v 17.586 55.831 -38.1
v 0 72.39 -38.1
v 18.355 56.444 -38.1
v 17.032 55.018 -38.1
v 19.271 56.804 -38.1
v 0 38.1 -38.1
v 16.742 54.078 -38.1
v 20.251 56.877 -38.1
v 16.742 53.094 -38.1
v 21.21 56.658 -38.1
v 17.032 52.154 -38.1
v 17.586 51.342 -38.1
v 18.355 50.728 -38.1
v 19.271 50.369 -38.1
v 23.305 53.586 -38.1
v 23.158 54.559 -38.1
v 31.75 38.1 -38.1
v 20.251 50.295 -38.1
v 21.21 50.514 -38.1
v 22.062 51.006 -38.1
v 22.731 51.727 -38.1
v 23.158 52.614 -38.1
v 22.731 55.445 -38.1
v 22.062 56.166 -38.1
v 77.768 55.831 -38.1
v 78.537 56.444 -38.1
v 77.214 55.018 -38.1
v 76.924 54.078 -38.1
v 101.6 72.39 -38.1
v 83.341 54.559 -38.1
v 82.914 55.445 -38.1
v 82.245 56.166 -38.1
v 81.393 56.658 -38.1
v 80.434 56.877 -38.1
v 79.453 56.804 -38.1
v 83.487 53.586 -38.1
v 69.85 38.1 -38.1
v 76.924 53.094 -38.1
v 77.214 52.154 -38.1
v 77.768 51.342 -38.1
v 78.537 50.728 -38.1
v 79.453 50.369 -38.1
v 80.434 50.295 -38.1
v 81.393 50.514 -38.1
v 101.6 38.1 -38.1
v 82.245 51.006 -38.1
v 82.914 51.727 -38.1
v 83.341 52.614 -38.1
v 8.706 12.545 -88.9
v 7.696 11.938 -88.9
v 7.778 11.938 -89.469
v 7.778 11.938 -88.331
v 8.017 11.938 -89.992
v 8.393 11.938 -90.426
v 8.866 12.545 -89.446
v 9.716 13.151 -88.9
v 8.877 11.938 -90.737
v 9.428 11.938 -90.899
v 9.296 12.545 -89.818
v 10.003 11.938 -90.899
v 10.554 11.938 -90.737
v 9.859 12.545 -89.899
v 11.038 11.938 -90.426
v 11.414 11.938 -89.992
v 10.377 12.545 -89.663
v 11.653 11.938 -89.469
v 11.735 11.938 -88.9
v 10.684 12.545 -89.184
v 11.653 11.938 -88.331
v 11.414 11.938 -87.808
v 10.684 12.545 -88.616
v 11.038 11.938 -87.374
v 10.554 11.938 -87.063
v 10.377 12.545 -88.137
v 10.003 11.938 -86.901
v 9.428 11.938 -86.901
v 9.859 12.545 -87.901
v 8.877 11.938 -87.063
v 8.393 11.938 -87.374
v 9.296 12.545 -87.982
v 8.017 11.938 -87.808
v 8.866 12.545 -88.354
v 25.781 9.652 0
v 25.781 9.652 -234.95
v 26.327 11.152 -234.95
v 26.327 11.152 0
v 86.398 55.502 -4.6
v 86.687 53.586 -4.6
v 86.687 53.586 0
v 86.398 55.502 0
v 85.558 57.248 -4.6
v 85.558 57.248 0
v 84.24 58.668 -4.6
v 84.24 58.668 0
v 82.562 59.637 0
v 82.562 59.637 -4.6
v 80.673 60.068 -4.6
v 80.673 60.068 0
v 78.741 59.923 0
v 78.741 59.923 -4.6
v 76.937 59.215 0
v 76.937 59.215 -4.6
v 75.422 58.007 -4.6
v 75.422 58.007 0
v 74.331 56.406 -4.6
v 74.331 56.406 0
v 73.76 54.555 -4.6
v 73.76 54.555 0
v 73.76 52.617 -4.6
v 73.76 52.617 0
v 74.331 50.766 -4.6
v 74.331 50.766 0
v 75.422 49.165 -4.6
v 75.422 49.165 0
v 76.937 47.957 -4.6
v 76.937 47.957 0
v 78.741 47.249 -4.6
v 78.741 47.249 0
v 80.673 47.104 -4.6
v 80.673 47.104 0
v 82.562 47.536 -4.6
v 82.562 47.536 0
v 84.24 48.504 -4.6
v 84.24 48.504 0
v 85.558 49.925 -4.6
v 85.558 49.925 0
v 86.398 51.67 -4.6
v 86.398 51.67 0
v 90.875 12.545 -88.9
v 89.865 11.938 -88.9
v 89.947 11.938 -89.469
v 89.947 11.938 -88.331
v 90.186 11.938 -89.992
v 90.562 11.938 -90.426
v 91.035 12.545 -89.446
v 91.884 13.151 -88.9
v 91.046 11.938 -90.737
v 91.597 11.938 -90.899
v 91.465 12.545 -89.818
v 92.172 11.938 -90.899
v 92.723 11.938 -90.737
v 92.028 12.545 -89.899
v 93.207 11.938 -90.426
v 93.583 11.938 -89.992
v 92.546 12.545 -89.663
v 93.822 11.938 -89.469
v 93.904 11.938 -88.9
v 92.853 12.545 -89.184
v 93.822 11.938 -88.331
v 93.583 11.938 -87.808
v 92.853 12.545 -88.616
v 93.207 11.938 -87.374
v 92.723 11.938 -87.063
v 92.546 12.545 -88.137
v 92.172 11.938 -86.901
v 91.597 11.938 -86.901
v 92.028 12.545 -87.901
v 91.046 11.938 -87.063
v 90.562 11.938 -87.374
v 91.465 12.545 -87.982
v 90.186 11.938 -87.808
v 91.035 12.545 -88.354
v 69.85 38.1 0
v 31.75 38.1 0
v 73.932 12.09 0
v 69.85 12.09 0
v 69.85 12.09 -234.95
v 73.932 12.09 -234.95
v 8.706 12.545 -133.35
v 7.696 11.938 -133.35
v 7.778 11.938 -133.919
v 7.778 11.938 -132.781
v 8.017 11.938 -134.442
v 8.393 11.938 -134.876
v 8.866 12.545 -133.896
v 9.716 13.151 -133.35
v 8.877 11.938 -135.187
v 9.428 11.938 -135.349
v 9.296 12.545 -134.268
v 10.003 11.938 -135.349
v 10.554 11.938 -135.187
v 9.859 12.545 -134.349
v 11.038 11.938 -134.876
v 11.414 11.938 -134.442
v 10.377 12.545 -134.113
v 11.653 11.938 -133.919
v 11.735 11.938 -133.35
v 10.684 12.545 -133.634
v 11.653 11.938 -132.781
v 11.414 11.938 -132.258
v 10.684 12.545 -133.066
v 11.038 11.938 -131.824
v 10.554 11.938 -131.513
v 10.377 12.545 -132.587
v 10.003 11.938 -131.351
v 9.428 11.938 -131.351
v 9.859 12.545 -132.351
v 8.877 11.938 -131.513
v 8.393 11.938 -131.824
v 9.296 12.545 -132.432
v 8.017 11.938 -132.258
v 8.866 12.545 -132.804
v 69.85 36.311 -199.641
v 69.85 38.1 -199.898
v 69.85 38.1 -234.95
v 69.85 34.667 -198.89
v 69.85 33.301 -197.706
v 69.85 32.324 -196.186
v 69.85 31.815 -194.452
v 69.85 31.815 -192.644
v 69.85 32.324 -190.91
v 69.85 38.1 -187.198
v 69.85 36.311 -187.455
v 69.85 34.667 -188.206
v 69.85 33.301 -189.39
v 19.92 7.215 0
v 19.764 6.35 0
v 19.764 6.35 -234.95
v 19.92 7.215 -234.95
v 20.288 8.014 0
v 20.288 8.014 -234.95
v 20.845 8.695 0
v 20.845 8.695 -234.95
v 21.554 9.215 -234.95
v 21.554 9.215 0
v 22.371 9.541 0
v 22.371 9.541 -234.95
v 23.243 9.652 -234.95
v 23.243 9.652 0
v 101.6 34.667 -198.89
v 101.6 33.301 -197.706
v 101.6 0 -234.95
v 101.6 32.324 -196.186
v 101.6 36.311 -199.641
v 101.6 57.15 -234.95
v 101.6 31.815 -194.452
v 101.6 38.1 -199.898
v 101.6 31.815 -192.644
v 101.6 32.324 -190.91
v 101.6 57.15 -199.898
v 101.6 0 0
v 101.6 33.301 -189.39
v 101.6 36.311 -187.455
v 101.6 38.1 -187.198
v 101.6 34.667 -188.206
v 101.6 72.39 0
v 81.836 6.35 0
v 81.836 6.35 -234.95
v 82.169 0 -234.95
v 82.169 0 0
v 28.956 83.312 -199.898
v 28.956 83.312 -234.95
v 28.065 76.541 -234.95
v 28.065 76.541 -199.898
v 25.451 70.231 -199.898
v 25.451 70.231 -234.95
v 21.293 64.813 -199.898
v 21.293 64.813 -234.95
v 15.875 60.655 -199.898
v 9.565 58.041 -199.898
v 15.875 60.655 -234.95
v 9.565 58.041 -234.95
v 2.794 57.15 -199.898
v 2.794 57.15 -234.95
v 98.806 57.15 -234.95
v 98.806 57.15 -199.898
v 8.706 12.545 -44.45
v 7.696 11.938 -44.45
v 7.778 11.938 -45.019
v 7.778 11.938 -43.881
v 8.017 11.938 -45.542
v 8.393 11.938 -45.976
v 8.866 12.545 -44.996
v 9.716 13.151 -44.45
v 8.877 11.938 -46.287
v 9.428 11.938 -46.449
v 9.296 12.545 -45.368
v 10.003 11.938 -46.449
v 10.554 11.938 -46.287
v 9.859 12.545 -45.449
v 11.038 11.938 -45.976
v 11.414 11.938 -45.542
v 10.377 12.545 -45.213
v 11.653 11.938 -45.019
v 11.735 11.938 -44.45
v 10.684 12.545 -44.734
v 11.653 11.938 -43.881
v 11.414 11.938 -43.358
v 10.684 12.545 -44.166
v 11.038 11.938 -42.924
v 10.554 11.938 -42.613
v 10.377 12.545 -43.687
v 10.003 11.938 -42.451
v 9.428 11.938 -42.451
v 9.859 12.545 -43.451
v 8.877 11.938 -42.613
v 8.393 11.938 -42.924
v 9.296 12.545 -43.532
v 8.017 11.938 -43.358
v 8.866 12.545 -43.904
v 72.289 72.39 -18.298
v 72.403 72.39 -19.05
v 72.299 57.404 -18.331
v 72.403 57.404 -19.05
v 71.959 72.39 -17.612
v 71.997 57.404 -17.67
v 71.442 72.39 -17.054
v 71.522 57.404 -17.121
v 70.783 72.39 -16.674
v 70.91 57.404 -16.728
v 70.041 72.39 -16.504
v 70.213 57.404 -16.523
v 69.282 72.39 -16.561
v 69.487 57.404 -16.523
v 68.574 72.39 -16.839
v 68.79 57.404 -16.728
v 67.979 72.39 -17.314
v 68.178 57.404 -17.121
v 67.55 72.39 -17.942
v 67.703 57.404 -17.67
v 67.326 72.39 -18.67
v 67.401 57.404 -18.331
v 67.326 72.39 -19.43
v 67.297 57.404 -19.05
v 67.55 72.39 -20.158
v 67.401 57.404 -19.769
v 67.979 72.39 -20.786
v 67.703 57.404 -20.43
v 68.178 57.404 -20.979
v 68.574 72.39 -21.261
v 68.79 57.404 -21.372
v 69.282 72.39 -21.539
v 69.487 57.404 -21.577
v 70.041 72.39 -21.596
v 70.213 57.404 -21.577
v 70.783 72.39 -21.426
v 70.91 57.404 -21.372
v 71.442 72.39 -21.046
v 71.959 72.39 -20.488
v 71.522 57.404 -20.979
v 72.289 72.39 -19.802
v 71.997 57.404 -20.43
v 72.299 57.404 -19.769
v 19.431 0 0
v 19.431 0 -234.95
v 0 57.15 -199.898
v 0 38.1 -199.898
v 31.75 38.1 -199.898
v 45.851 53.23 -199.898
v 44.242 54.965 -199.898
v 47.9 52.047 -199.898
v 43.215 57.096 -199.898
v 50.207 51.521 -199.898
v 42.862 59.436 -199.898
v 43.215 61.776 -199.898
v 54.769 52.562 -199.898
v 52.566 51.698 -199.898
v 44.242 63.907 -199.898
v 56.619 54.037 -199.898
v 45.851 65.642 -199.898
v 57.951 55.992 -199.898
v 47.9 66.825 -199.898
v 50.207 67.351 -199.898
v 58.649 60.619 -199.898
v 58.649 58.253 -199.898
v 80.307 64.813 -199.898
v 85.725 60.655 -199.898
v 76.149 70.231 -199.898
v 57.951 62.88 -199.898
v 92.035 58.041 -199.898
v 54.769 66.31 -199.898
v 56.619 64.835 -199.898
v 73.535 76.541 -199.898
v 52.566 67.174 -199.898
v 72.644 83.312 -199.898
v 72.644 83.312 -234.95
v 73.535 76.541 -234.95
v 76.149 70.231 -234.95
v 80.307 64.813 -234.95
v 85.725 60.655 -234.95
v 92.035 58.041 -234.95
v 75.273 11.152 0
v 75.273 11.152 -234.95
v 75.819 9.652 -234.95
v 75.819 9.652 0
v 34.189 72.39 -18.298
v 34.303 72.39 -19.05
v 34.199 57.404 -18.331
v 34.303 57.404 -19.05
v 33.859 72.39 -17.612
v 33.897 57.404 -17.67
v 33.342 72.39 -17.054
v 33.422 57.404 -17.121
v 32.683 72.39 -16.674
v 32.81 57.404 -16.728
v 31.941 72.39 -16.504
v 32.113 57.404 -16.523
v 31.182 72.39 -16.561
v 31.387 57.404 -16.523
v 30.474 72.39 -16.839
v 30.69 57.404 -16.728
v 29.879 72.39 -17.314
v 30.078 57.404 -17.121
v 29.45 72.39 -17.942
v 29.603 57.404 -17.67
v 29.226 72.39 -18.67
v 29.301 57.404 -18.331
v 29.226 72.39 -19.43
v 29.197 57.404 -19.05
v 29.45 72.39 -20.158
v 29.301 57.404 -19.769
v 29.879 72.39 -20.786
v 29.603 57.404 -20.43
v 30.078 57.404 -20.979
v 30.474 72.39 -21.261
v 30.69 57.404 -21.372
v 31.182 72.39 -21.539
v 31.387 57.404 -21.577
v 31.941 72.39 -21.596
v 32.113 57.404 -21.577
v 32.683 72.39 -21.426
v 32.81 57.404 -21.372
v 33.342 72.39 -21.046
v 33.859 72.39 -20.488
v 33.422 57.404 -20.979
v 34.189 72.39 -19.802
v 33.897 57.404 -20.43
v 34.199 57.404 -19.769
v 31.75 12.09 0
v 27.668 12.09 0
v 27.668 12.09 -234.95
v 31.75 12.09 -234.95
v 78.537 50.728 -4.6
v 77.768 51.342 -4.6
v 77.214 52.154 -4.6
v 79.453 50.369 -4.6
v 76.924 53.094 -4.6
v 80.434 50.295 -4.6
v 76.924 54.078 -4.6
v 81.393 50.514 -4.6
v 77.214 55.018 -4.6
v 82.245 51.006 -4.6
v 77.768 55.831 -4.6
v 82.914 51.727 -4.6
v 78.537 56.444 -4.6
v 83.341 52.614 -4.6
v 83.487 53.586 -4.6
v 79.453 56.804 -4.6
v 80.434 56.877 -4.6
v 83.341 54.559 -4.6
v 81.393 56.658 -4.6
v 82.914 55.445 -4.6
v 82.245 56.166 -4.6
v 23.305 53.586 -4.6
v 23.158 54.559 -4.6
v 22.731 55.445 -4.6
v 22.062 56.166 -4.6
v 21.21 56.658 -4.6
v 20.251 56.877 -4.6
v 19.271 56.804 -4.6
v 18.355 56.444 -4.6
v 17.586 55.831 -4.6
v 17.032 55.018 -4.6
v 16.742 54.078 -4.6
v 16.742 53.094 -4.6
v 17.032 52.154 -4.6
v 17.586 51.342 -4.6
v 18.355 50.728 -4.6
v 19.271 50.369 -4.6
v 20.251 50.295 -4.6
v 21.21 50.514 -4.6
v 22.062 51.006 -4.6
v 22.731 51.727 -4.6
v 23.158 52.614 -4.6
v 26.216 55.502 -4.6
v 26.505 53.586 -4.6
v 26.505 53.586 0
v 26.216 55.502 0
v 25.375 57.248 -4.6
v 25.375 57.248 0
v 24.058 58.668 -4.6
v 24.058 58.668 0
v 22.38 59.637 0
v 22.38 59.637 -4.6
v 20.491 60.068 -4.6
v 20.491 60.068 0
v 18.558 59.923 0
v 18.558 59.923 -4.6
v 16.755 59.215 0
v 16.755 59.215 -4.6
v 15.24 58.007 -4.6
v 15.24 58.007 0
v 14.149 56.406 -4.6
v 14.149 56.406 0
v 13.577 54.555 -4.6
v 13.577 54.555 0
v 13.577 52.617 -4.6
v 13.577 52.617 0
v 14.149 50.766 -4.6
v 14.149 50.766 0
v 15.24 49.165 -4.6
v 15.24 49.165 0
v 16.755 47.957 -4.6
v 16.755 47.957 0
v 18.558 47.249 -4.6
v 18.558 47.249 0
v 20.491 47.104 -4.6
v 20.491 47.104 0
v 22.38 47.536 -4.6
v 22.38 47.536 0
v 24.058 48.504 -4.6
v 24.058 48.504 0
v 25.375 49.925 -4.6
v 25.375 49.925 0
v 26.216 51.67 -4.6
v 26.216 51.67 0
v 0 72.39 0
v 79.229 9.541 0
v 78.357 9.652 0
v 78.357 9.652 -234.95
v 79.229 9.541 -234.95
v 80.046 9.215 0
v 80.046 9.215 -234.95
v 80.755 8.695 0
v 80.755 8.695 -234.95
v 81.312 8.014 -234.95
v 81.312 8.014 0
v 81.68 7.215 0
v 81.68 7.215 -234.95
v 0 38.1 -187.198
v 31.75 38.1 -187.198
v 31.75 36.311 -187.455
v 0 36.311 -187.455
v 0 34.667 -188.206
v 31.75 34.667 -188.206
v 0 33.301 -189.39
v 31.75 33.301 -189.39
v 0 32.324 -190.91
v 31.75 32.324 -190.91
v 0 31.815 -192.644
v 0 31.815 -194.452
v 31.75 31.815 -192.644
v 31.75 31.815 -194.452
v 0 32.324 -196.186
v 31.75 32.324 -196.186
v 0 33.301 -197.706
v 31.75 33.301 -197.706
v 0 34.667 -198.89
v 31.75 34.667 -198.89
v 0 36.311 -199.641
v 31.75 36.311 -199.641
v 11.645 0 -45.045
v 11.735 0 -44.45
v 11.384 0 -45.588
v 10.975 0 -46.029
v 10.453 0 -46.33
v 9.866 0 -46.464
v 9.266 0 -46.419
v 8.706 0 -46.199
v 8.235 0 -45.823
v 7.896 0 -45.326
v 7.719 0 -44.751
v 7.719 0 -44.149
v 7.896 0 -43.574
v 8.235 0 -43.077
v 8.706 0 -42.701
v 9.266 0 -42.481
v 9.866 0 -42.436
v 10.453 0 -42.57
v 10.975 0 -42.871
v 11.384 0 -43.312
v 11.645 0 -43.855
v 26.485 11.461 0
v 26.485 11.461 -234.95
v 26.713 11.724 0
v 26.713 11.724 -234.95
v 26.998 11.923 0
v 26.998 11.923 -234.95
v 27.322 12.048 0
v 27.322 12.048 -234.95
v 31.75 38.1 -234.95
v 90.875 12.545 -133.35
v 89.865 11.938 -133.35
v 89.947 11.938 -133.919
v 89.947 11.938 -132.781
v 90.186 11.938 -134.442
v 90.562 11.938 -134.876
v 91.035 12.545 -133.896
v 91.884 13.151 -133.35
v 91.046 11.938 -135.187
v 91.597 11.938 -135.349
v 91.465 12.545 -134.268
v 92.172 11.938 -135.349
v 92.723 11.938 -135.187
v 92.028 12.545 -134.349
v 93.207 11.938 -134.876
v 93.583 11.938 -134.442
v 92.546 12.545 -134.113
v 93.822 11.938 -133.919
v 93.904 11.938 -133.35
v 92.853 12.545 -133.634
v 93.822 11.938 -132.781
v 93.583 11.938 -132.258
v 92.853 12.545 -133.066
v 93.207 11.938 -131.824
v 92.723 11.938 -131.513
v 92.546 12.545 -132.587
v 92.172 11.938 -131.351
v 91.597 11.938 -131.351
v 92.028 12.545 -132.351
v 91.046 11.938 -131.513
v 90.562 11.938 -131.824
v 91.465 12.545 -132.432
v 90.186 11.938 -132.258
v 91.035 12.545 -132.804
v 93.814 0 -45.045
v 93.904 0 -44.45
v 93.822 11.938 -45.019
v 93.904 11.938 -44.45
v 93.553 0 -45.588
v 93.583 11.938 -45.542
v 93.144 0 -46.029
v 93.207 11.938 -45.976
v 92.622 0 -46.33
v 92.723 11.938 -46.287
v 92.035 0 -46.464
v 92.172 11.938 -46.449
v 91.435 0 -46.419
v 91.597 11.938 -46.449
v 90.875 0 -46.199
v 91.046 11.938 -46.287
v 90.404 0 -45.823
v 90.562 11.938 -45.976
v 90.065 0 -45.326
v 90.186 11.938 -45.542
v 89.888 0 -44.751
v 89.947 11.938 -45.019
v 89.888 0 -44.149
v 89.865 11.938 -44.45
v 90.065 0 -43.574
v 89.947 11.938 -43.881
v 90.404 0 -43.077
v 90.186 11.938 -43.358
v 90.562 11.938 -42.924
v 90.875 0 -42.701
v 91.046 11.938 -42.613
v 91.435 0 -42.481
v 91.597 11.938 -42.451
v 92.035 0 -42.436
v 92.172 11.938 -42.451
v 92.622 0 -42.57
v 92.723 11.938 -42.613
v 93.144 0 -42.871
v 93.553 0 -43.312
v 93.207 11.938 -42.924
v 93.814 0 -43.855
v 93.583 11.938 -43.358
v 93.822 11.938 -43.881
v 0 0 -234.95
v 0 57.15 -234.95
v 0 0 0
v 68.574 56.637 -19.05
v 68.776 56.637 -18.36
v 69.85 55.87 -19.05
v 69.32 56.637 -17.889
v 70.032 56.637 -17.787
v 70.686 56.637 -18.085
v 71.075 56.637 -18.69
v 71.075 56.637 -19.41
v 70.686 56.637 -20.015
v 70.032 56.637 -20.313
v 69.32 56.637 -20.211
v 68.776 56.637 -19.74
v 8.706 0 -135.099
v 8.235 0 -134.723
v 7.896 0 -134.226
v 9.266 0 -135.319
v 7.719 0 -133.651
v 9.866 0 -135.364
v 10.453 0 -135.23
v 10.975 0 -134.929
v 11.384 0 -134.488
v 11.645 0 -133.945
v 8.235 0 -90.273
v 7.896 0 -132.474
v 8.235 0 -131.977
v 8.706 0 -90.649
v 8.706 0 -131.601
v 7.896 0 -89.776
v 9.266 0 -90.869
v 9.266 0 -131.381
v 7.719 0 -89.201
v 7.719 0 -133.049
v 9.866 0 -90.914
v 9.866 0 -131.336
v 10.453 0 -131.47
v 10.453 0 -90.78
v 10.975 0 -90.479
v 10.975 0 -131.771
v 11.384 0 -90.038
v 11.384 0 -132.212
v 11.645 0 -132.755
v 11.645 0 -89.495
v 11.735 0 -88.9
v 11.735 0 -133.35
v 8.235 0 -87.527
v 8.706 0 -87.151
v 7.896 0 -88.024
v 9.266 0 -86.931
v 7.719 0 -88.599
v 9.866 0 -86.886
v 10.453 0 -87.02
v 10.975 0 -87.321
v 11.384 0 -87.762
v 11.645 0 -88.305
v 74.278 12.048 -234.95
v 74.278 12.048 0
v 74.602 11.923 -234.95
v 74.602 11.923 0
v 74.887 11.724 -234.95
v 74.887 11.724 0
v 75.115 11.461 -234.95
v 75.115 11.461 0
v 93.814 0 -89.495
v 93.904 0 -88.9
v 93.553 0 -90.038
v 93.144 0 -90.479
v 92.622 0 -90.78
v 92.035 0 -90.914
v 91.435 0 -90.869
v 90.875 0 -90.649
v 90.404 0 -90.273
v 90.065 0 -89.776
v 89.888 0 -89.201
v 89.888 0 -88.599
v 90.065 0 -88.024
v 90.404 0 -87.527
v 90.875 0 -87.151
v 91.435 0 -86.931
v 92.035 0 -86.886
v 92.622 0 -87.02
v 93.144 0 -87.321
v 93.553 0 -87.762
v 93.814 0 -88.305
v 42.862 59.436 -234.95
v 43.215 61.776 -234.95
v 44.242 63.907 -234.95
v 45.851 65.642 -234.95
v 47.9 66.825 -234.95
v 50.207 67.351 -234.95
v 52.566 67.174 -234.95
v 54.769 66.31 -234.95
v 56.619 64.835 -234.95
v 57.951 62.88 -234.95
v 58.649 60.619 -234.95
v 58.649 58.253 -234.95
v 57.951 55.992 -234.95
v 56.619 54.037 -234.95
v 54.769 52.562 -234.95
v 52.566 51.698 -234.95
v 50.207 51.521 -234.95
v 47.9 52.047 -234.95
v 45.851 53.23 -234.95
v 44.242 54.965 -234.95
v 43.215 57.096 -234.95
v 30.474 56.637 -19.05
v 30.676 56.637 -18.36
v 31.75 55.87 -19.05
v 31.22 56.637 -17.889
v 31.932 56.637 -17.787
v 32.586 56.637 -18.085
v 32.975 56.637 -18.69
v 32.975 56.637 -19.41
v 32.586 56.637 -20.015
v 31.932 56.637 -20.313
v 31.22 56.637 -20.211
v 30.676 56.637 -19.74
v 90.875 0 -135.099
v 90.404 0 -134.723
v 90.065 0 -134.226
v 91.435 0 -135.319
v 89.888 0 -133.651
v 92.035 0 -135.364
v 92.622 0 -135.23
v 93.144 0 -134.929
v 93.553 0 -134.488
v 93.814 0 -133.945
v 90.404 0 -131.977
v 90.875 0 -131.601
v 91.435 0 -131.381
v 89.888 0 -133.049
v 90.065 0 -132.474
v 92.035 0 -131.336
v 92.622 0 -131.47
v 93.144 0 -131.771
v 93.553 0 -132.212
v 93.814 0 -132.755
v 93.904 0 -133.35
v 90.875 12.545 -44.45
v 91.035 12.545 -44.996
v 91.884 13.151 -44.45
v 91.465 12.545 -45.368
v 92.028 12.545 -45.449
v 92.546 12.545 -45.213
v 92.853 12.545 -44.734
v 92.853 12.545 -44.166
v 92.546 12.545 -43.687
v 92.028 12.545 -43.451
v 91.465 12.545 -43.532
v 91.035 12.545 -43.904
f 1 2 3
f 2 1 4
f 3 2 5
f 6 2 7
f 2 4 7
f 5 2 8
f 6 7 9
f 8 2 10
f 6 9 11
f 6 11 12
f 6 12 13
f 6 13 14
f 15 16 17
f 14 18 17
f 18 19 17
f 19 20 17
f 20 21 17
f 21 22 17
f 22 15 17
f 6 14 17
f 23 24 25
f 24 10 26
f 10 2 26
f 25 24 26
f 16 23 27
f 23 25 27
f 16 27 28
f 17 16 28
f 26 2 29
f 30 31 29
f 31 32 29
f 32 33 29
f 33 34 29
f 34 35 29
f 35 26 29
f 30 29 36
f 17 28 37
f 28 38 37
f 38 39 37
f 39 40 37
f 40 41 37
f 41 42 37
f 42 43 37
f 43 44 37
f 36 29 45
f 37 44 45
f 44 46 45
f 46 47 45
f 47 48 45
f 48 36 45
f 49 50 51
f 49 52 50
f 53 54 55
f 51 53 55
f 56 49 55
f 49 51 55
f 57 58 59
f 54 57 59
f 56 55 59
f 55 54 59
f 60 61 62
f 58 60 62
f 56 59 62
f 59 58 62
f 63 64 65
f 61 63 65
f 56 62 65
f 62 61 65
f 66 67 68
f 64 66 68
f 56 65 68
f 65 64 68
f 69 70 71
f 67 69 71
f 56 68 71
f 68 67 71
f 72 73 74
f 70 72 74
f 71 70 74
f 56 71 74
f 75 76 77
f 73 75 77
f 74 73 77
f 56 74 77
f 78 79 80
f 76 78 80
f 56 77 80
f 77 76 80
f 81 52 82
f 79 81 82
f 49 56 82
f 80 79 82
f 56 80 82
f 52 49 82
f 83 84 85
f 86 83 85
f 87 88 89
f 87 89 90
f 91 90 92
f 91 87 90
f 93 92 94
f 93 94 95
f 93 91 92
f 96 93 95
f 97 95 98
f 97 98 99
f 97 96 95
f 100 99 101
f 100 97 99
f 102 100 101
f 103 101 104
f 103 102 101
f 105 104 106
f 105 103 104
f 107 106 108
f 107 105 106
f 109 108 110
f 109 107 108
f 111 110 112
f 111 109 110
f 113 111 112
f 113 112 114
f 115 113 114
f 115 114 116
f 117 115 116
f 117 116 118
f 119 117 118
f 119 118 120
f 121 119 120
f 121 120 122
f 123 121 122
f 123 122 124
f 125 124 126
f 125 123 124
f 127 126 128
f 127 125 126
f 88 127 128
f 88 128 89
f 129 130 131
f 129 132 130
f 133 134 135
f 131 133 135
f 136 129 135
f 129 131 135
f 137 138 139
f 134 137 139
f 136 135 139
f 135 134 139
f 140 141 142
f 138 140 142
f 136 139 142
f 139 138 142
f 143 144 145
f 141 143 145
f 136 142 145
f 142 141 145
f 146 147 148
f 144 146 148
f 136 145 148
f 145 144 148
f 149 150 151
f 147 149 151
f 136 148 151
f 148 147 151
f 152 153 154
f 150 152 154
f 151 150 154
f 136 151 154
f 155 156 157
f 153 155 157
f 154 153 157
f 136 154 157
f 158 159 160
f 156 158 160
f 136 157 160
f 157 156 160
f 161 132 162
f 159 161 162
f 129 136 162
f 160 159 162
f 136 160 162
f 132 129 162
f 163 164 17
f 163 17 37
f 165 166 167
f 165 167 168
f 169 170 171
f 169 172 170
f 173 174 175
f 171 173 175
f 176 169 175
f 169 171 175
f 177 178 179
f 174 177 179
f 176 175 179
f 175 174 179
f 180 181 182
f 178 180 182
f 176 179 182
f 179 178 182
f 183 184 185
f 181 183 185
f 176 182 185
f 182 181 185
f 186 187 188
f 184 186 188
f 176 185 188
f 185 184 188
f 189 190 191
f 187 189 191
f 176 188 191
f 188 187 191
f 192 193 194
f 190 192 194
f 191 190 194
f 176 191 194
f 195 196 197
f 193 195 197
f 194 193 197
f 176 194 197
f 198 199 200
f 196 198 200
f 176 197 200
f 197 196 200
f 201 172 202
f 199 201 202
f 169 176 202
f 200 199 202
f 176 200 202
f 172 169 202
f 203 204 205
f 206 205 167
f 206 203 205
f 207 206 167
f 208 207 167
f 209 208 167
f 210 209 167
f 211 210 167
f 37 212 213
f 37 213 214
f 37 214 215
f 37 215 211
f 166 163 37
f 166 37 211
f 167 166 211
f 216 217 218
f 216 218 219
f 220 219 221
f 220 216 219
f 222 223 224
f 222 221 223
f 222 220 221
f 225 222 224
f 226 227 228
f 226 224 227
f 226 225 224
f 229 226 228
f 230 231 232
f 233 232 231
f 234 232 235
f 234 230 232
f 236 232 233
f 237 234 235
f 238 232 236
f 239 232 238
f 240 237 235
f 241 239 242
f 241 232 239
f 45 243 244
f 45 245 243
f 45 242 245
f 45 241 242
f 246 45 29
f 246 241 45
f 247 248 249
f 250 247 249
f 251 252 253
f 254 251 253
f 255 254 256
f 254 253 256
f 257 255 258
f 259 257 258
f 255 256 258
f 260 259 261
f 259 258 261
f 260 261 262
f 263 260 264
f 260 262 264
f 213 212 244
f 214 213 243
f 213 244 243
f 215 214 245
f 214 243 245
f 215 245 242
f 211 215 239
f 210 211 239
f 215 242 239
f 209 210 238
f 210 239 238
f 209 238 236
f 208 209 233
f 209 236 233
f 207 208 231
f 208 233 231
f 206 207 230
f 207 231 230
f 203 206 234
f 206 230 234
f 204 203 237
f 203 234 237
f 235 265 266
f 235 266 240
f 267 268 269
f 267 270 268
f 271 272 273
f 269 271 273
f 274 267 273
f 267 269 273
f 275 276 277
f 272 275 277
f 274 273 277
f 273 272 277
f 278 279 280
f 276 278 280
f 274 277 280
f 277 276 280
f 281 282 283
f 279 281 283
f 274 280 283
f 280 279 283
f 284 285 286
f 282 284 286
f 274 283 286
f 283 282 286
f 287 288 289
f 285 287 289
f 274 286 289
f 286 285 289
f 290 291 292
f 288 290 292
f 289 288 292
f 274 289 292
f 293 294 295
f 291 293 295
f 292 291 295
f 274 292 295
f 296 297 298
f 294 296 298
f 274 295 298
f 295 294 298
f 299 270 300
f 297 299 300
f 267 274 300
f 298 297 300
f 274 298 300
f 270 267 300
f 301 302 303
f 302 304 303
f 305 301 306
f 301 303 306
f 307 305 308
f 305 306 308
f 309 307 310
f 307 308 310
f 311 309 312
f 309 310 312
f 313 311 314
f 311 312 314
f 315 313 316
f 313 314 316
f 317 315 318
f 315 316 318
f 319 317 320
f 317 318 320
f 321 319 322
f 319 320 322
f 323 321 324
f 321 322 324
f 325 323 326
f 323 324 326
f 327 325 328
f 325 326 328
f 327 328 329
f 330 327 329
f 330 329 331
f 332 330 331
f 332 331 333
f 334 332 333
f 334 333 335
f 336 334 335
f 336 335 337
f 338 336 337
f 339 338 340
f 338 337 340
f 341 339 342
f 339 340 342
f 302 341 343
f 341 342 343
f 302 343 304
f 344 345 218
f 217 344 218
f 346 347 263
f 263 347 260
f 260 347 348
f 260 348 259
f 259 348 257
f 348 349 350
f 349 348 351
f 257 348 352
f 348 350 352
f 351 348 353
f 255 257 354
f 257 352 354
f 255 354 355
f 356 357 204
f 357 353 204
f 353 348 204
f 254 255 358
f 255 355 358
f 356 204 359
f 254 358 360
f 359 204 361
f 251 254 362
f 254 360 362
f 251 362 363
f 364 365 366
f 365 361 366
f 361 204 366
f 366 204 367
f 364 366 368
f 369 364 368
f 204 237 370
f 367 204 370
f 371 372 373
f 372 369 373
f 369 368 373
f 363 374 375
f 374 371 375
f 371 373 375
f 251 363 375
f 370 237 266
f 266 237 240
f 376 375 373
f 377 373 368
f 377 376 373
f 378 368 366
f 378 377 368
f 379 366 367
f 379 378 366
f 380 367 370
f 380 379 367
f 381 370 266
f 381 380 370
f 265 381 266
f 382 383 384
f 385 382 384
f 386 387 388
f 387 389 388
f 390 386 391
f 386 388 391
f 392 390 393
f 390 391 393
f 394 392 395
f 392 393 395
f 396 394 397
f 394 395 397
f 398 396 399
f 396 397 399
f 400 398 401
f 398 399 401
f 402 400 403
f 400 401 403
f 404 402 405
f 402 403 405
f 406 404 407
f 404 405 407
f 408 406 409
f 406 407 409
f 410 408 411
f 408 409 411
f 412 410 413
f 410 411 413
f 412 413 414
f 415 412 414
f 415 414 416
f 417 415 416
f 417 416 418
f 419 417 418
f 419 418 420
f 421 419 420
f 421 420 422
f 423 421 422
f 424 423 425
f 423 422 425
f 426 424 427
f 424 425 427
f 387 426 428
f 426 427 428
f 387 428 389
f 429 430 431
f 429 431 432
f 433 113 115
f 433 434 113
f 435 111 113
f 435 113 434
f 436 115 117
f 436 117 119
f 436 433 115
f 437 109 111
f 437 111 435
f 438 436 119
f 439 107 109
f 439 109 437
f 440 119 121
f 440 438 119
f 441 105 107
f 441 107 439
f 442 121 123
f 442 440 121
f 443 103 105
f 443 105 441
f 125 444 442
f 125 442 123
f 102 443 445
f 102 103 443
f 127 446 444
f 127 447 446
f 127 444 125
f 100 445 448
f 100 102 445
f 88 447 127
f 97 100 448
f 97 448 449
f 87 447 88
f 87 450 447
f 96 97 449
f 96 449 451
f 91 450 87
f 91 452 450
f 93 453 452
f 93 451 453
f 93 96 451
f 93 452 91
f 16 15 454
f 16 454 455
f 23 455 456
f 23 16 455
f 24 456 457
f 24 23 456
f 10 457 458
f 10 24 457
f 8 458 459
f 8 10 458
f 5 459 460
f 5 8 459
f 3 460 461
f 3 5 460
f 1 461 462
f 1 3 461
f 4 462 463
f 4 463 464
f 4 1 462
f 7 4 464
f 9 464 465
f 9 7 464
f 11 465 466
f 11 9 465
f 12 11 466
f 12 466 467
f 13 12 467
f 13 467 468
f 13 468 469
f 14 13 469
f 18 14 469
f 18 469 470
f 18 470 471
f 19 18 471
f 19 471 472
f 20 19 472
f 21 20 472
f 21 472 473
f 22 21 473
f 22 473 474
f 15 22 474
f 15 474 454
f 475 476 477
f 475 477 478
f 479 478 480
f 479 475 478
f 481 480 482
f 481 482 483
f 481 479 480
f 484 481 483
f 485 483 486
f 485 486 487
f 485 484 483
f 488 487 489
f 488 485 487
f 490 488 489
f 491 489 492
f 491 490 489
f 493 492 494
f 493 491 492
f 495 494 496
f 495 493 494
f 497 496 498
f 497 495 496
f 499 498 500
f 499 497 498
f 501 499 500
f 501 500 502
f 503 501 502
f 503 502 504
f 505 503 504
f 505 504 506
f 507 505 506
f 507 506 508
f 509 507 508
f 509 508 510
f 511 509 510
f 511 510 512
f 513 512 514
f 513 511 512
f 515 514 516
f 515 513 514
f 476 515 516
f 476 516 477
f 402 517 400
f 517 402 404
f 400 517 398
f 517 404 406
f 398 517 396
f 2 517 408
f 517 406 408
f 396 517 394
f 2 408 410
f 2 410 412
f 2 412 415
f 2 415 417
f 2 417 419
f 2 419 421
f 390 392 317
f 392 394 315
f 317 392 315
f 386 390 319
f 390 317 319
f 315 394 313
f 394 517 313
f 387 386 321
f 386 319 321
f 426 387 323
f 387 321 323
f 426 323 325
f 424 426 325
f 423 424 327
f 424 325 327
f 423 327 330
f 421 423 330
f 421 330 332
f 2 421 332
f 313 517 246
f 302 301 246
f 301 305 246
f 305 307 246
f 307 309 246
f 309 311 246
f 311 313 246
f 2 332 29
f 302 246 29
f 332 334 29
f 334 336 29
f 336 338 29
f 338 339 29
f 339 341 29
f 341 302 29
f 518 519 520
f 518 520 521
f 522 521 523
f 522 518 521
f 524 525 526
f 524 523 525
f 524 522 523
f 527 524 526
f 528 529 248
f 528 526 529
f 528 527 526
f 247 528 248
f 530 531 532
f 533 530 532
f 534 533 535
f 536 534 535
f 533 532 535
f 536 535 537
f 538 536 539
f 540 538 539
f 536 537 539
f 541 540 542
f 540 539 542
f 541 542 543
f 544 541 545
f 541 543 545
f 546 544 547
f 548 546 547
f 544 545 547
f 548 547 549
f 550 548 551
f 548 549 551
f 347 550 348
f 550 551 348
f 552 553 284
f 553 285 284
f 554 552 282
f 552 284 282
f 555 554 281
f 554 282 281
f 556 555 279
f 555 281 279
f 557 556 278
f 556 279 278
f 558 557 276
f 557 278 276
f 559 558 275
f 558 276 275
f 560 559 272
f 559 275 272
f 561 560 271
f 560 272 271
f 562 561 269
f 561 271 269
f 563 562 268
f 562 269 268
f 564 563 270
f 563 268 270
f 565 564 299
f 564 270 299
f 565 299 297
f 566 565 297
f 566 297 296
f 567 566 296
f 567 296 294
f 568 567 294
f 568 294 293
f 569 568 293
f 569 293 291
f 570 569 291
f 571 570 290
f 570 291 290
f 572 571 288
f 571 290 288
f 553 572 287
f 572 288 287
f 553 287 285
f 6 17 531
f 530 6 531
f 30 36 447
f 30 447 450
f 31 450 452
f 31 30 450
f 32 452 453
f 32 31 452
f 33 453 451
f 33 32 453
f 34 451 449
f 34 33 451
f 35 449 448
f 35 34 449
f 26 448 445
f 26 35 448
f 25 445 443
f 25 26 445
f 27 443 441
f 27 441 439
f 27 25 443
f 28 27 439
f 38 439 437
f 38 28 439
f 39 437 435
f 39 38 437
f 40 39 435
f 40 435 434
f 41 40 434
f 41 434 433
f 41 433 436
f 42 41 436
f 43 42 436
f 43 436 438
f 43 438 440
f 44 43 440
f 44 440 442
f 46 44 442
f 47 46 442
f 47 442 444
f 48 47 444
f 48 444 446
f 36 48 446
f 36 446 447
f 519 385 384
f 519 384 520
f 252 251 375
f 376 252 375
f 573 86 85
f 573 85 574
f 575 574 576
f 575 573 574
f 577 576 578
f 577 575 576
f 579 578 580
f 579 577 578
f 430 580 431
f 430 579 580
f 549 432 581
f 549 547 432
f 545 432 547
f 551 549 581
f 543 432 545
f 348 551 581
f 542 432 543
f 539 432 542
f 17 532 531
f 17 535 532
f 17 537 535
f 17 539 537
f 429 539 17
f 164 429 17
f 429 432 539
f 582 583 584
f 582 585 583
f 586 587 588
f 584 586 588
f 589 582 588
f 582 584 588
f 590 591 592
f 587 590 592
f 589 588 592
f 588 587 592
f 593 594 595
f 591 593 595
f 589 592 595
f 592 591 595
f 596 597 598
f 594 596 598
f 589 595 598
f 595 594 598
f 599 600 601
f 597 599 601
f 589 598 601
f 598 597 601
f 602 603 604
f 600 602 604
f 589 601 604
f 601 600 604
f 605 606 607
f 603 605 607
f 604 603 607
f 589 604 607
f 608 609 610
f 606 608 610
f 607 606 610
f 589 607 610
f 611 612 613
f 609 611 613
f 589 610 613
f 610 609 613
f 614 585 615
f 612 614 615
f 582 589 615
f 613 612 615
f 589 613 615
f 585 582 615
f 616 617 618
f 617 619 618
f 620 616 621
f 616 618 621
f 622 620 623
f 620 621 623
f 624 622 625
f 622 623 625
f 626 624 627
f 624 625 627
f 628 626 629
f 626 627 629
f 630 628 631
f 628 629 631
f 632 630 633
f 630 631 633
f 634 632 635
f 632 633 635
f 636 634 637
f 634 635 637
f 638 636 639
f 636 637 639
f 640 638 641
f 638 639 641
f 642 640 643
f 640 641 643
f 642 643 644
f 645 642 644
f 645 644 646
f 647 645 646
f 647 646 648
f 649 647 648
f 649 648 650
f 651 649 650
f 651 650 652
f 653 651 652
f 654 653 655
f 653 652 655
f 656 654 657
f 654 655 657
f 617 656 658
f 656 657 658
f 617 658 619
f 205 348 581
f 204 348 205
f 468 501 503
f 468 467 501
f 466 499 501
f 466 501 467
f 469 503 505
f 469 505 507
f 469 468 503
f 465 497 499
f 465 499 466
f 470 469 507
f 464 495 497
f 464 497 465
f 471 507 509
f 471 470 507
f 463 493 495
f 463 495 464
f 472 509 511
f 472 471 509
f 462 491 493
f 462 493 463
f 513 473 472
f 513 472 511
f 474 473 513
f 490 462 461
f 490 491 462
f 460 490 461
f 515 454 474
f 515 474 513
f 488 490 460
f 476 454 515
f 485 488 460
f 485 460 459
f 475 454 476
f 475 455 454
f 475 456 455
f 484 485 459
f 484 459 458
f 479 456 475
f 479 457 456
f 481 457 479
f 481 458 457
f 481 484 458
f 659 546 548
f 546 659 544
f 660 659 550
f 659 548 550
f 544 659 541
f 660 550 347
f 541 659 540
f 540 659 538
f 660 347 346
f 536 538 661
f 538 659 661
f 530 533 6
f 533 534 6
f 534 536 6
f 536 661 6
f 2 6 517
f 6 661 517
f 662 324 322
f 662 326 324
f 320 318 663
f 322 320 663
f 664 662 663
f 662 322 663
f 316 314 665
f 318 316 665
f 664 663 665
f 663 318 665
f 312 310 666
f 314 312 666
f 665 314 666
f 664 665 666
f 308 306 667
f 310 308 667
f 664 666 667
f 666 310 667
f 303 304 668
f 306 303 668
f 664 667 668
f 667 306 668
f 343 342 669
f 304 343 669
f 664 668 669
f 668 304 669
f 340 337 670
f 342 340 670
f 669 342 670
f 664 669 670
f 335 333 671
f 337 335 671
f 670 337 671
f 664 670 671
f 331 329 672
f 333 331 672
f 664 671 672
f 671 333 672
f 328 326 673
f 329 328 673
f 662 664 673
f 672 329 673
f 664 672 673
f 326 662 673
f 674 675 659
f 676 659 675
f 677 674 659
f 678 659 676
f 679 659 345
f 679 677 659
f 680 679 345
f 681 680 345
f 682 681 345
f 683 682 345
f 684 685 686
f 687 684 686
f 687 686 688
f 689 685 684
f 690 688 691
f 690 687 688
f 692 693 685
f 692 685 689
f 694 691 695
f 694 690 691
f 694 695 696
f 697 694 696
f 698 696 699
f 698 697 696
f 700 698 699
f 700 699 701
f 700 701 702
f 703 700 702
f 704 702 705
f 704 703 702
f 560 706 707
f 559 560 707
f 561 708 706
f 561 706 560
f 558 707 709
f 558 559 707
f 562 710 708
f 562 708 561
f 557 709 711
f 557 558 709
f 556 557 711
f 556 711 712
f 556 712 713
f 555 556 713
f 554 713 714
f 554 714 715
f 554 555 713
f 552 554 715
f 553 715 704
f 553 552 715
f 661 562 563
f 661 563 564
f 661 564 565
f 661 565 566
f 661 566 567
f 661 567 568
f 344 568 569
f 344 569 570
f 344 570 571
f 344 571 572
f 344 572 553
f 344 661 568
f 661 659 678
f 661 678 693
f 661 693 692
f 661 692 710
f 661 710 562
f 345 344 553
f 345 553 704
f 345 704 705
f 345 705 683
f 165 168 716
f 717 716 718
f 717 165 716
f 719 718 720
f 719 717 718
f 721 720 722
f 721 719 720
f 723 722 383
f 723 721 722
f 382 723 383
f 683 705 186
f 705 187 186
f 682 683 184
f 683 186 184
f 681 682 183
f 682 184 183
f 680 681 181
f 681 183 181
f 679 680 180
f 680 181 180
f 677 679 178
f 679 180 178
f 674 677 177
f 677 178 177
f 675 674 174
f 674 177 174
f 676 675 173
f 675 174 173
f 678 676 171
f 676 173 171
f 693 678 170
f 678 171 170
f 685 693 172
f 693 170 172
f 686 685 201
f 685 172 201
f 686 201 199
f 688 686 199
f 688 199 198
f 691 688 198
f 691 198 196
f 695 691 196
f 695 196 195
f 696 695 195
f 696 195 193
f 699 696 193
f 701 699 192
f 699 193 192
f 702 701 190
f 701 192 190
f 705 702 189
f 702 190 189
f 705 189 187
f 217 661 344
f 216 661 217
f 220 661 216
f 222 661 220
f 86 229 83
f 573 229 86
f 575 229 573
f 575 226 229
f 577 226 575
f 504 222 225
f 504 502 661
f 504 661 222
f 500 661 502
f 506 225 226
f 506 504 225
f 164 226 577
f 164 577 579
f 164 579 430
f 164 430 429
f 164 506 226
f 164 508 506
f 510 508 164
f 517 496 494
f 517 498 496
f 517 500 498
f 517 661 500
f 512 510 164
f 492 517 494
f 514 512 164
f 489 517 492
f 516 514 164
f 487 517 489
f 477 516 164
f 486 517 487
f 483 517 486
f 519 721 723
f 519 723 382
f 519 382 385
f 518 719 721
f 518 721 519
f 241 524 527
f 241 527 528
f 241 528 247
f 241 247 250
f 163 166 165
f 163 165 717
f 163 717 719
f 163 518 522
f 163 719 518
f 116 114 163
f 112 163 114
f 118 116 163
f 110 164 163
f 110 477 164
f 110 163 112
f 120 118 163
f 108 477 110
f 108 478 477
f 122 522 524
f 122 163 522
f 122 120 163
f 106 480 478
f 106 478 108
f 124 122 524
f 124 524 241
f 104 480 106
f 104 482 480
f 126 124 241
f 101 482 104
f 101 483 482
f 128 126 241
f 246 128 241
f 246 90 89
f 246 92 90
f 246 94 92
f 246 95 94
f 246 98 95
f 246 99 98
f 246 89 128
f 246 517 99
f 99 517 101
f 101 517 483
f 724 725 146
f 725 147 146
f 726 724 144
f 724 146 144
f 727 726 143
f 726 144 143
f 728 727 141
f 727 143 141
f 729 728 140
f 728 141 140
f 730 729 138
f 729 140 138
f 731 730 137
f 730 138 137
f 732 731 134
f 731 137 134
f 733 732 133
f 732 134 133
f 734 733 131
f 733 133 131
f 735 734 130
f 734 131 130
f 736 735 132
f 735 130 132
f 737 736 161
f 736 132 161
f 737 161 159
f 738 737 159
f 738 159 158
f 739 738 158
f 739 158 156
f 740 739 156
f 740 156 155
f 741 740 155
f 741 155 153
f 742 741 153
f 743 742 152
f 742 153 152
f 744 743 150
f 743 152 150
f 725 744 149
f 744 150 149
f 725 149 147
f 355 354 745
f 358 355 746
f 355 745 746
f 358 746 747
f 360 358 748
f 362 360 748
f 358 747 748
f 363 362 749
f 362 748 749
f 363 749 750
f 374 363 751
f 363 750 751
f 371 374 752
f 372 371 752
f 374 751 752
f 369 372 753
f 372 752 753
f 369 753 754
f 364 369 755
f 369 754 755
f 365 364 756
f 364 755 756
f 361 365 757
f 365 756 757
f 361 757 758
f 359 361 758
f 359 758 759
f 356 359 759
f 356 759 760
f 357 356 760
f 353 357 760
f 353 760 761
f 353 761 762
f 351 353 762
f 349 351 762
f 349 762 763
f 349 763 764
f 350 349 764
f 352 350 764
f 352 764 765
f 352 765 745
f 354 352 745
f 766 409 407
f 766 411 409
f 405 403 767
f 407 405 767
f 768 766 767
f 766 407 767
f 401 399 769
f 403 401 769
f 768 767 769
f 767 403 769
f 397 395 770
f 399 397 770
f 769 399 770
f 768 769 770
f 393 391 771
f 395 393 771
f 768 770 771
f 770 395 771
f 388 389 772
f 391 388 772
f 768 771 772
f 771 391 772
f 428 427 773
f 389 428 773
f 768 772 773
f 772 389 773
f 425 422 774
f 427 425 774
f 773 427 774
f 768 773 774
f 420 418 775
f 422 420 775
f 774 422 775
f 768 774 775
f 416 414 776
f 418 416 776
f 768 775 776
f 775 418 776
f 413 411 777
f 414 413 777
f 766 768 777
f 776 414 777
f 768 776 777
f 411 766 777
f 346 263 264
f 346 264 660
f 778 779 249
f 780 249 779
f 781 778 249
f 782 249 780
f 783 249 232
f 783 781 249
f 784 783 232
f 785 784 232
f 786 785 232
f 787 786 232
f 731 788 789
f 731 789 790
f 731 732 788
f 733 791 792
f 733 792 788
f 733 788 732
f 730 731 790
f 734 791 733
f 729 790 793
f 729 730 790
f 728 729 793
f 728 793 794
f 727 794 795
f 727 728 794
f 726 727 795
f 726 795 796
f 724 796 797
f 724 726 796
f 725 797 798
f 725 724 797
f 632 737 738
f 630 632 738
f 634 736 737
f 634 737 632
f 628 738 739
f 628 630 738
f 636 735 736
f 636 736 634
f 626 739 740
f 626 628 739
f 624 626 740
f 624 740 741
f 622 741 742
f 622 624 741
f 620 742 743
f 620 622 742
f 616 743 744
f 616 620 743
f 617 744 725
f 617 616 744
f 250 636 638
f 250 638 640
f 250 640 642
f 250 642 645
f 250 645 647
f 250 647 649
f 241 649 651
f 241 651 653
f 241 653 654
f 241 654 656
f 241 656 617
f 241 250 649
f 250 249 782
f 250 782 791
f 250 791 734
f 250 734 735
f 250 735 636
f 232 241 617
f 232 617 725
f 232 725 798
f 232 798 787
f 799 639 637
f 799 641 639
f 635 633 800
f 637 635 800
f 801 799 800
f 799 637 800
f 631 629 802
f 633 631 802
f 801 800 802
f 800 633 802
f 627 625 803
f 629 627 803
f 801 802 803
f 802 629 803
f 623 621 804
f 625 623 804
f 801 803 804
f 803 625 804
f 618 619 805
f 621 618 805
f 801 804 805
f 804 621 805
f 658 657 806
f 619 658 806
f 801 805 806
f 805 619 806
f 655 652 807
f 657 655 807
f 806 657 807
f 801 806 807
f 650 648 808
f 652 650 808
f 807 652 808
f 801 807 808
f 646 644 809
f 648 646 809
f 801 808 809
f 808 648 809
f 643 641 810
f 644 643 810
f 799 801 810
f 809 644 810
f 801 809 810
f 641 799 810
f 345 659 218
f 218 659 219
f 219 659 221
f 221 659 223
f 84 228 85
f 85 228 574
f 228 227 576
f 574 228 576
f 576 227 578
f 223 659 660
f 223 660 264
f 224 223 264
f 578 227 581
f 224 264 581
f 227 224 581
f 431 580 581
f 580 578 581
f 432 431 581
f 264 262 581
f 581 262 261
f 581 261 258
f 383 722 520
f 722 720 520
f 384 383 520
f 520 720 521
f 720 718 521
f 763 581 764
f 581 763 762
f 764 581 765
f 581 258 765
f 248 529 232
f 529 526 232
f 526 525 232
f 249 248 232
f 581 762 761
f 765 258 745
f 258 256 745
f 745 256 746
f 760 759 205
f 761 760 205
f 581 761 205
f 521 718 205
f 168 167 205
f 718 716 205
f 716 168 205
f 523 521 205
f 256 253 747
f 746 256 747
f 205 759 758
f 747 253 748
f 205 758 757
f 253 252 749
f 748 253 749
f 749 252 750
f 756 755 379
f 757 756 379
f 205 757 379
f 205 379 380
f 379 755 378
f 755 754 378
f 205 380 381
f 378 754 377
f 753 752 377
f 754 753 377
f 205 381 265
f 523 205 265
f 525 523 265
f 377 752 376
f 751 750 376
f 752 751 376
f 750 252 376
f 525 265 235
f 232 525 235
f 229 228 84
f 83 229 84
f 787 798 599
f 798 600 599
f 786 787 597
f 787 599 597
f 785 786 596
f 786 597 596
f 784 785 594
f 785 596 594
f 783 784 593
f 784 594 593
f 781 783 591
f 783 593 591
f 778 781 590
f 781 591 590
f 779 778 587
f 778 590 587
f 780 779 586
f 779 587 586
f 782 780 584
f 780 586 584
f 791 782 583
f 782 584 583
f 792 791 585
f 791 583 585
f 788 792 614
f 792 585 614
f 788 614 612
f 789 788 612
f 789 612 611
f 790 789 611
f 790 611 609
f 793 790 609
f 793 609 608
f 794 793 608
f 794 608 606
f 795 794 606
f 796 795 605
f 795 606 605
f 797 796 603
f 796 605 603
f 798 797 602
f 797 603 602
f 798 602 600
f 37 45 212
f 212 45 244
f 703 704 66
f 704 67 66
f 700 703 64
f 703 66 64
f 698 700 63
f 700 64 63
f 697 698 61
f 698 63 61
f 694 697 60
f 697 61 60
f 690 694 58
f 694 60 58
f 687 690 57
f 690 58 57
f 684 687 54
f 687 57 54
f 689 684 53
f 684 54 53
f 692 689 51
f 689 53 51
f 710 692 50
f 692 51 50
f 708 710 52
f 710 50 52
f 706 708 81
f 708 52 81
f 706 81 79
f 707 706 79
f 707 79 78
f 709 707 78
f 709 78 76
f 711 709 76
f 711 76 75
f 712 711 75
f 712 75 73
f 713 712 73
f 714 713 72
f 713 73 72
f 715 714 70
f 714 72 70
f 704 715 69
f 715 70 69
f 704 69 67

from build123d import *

# Parameters (mm, degrees)
SKETCH1_W                                    = 101.6
SKETCH1_H                                    = 83.312
SOLID_EXTRUDE_DEPTH                          = 234.95
BOTTOM_SLIDE_WAY_CUT_EXTRUDE_DEPTH           = 270.193149697
THROAT_CASTING_CUT_EXTRUDE_DEPTH             = 270.193149697
SHOULDERS_SCREW_HOLE_CUT_EXTRUDE_REACH       = 271.193
SKETCH4_R                                    = 7.9375
CBORE_START                                  = -38.1
CBORE_FOR_M6_PAN_HEAD_MACHINE_SCREW1_OUT_R   = 3.3
CBORE_FOR_M6_PAN_HEAD_MACHINE_SCREW1_DEPTH   = 38.1
CBORE_START_2                                = -4.6
CBORE_FOR_M6_PAN_HEAD_MACHINE_SCREW1_2_O_R   = 6.5
CBORE_FOR_M6_PAN_HEAD_MACHINE_SCREW1_2_O_R_2 = 3.3
CBORE_FOR_M6_PAN_HEAD_MACHINE_SCREW1_2_DEPTH = 4.6
SKETCH7_W                                    = 38.1
SKETCH7_H                                    = 10.922
STATIONARY_JAW_TRIM_CUT_EXTRUDE1_DEPTH       = 270.193149697
F_1_4_20_TAPPED_HOLE1_D                      = 5.1054
F_1_4_20_TAPPED_HOLE1_DEPTH                  = 14.986
F_1_4_20_TAPPED_HOLE1_TIP                    = 1.533816902
F_10_32_TAPPED_HOLE1_D                       = 4.0386
F_10_32_TAPPED_HOLE1_DEPTH                   = 11.938
F_10_32_TAPPED_HOLE1_TIP                     = 1.213317848


# Read off the part's stored shape, not the designer's step: CBORE for M6 Pan Head Machine Screw1
with BuildPart() as part:
    # Sketch1 → Solid extrude (new body)
    with BuildSketch(Plane.XY):
        with Locations((50.8, 41.656)):
            Rectangle(SKETCH1_W, SKETCH1_H)
    extrude(amount=-SOLID_EXTRUDE_DEPTH)

    # Sketch2 → Bottom slide way cut extrude (cut, through all)
    with BuildSketch(Plane.XY):
        with BuildLine():
            Line((19.431, 0), (19.763794004, 6.35008787))
            ThreePointArc((19.763794004, 6.35008787), (20.84487401, 8.695131686), (23.243283382, 9.652))
            Line((23.243283382, 9.652), (25.781, 9.652))
            Line((25.781, 9.652), (26.326795038, 11.151559542))
            ThreePointArc((26.326795038, 11.151559542), (26.849188972, 11.832356572), (27.667598166, 12.0904))
            Line((27.667598166, 12.0904), (31.75, 12.0904))
            Line((31.75, 12.0904), (31.75, 38.1))
            Line((31.75, 38.1), (69.85, 38.1))
            Line((69.85, 38.1), (69.85, 12.0904))
            Line((69.85, 12.0904), (73.932401834, 12.0904))
            ThreePointArc((73.932401834, 12.0904), (74.750811028, 11.832356572), (75.273204962, 11.151559542))
            Line((75.273204962, 11.151559542), (75.819, 9.652))
            Line((75.819, 9.652), (78.356716618, 9.652))
            ThreePointArc((78.356716618, 9.652), (80.75512599, 8.695131686), (81.836205996, 6.35008787))
            Line((81.836205996, 6.35008787), (82.169, 0))
            Line((82.169, 0), (19.431, 0))
        make_face()
    extrude(amount=-BOTTOM_SLIDE_WAY_CUT_EXTRUDE_DEPTH, mode=Mode.SUBTRACT)

    # Sketch3 → Throat/casting cut extrude (cut, through all)
    with BuildSketch(Plane(origin=(101.6, 0, 0), x_dir=(0, 0, -1), z_dir=(1, 0, 0))):
        with BuildLine():
            Line((0, 74.58075), (19.05, 74.58075))
            ThreePointArc((19.05, 74.58075), (23.540128061, 76.440621939), (25.4, 80.93075))
            Line((25.4, 80.93075), (25.4, 83.312))
            Line((25.4, 83.312), (0, 83.312))
            Line((0, 83.312), (0, 74.58075))
        make_face()
        with BuildLine():
            Line((38.1, 83.312), (38.1, 38.1))
            Line((38.1, 38.1), (187.198, 38.1))
            ThreePointArc((187.198, 38.1), (193.548, 31.75), (199.898, 38.1))
            Line((199.898, 38.1), (199.898, 83.312))
            Line((199.898, 83.312), (38.1, 83.312))
        make_face()
    extrude(amount=-THROAT_CASTING_CUT_EXTRUDE_DEPTH, mode=Mode.SUBTRACT)

    # Sketch4 → Shoulders/screw hole cut extrude (cut, up to next)
    with BuildSketch(Plane(origin=(0, 0, -234.95), x_dir=(-1, 0, 0), z_dir=(0, 0, -1)), mode=Mode.PRIVATE) as shoulders_screw_hole_cut_extrude_sk1:
        with Locations((-50.8, 59.436)):
            Circle(SKETCH4_R)
    shoulders_screw_hole_cut_extrude_tool1 = extrude(shoulders_screw_hole_cut_extrude_sk1.sketch, amount=-SHOULDERS_SCREW_HOLE_CUT_EXTRUDE_REACH, mode=Mode.PRIVATE) & part.part
    # Sketch4 → Shoulders/screw hole cut extrude (cut, up to next)
    with BuildSketch(Plane(origin=(0, 0, -234.95), x_dir=(-1, 0, 0), z_dir=(0, 0, -1)), mode=Mode.PRIVATE) as shoulders_screw_hole_cut_extrude_sk2:
        with BuildLine():
            Line((-2.794, 57.15), (0, 57.15))
            Line((0, 57.15), (0, 83.312))
            Line((0, 83.312), (-28.956, 83.312))
            ThreePointArc((-28.956, 83.312), (-21.293327609, 64.812672391), (-2.794, 57.15))
        make_face()
    shoulders_screw_hole_cut_extrude_tool2 = extrude(shoulders_screw_hole_cut_extrude_sk2.sketch, amount=-SHOULDERS_SCREW_HOLE_CUT_EXTRUDE_REACH, mode=Mode.PRIVATE) & part.part
    # Sketch4 → Shoulders/screw hole cut extrude (cut, up to next)
    with BuildSketch(Plane(origin=(0, 0, -234.95), x_dir=(-1, 0, 0), z_dir=(0, 0, -1)), mode=Mode.PRIVATE) as shoulders_screw_hole_cut_extrude_sk3:
        with BuildLine():
            Line((-101.6, 57.15), (-101.6, 83.312))
            Line((-101.6, 83.312), (-72.644, 83.312))
            ThreePointArc((-72.644, 83.312), (-80.306672391, 64.812672391), (-98.806, 57.15))
            Line((-98.806, 57.15), (-101.6, 57.15))
        make_face()
    shoulders_screw_hole_cut_extrude_tool3 = extrude(shoulders_screw_hole_cut_extrude_sk3.sketch, amount=-SHOULDERS_SCREW_HOLE_CUT_EXTRUDE_REACH, mode=Mode.PRIVATE) & part.part
    add(shoulders_screw_hole_cut_extrude_tool1.solids().sort_by_distance((50.8, 59.436, -234.95))[0], mode=Mode.SUBTRACT)
    add(shoulders_screw_hole_cut_extrude_tool2.solids().sort_by_distance((12.401182, 71.971794, -234.95))[0], mode=Mode.SUBTRACT)
    add(shoulders_screw_hole_cut_extrude_tool3.solids().sort_by_distance((89.198818, 71.971794, -234.95))[0], mode=Mode.SUBTRACT)

    # CBORE for M6 Pan Head Machine Screw1 out → CBORE for M6 Pan Head Machine Screw1 (cut)
    with BuildSketch(Plane.XY.offset(CBORE_START)):
        with Locations((80.187245779, 53.586240129)):
            Circle(CBORE_FOR_M6_PAN_HEAD_MACHINE_SCREW1_OUT_R)
        with Locations((20.004838326, 53.586240129)):
            Circle(CBORE_FOR_M6_PAN_HEAD_MACHINE_SCREW1_OUT_R)
    extrude(amount=CBORE_FOR_M6_PAN_HEAD_MACHINE_SCREW1_DEPTH, mode=Mode.SUBTRACT)

    # CBORE for M6 Pan Head Machine Screw1 2 o → CBORE for M6 Pan Head Machine Screw1 2 (cut)
    # profile 1 of 2: a face of its own
    with BuildSketch(Plane.XY.offset(CBORE_START_2)):
        with Locations((80.187245779, 53.586240129)):
            Circle(CBORE_FOR_M6_PAN_HEAD_MACHINE_SCREW1_2_O_R)
        with Locations((80.187245779, 53.586240129)):
            Circle(CBORE_FOR_M6_PAN_HEAD_MACHINE_SCREW1_2_O_R_2, mode=Mode.SUBTRACT)
    # profile 2 of 2: a face of its own
    with BuildSketch(Plane.XY.offset(CBORE_START_2)):
        with Locations((20.004838326, 53.586240129)):
            Circle(CBORE_FOR_M6_PAN_HEAD_MACHINE_SCREW1_2_O_R)
        with Locations((20.004838326, 53.586240129)):
            Circle(CBORE_FOR_M6_PAN_HEAD_MACHINE_SCREW1_2_O_R_2, mode=Mode.SUBTRACT)
    extrude(amount=CBORE_FOR_M6_PAN_HEAD_MACHINE_SCREW1_2_DEPTH, mode=Mode.SUBTRACT)

    # Sketch7 → Stationary jaw trim Cut-Extrude1 (cut, through all)
    with BuildSketch(Plane(origin=(101.6, 0, 0), x_dir=(0, 0, -1), z_dir=(1, 0, 0))):
        with Locations((19.05, 77.851)):
            Rectangle(SKETCH7_W, SKETCH7_H)
    extrude(amount=-STATIONARY_JAW_TRIM_CUT_EXTRUDE1_DEPTH, mode=Mode.SUBTRACT)

    # 1/4-20 Tapped Hole1
    with Locations(Plane(origin=(50.8, 72.39, 0), x_dir=(-1, 0, 0), z_dir=(0, 1, 0))):
        with Locations((19.05, -19.05), (-19.05, -19.05)):
            Hole(F_1_4_20_TAPPED_HOLE1_D / 2, depth=F_1_4_20_TAPPED_HOLE1_DEPTH)
            with Locations((0, 0, -(F_1_4_20_TAPPED_HOLE1_DEPTH + F_1_4_20_TAPPED_HOLE1_TIP / 2))):  # 118° drill point
                Cone(0, F_1_4_20_TAPPED_HOLE1_D / 2, F_1_4_20_TAPPED_HOLE1_TIP, mode=Mode.SUBTRACT)

    # #10-32 Tapped Hole1
    with Locations(Plane(origin=(0, 0, 0), x_dir=(-1, 0, 0), z_dir=(0, -1, 0))):
        with Locations((-9.7155, 88.9), (-9.7155, 44.45), (-9.7155, 133.35), (-91.8845, 44.45), (-91.8845, 88.9), (-91.8845, 133.35)):
            Hole(F_10_32_TAPPED_HOLE1_D / 2, depth=F_10_32_TAPPED_HOLE1_DEPTH)
            with Locations((0, 0, -(F_10_32_TAPPED_HOLE1_DEPTH + F_10_32_TAPPED_HOLE1_TIP / 2))):  # 118° drill point
                Cone(0, F_10_32_TAPPED_HOLE1_D / 2, F_10_32_TAPPED_HOLE1_TIP, mode=Mode.SUBTRACT)


solid = part.part
